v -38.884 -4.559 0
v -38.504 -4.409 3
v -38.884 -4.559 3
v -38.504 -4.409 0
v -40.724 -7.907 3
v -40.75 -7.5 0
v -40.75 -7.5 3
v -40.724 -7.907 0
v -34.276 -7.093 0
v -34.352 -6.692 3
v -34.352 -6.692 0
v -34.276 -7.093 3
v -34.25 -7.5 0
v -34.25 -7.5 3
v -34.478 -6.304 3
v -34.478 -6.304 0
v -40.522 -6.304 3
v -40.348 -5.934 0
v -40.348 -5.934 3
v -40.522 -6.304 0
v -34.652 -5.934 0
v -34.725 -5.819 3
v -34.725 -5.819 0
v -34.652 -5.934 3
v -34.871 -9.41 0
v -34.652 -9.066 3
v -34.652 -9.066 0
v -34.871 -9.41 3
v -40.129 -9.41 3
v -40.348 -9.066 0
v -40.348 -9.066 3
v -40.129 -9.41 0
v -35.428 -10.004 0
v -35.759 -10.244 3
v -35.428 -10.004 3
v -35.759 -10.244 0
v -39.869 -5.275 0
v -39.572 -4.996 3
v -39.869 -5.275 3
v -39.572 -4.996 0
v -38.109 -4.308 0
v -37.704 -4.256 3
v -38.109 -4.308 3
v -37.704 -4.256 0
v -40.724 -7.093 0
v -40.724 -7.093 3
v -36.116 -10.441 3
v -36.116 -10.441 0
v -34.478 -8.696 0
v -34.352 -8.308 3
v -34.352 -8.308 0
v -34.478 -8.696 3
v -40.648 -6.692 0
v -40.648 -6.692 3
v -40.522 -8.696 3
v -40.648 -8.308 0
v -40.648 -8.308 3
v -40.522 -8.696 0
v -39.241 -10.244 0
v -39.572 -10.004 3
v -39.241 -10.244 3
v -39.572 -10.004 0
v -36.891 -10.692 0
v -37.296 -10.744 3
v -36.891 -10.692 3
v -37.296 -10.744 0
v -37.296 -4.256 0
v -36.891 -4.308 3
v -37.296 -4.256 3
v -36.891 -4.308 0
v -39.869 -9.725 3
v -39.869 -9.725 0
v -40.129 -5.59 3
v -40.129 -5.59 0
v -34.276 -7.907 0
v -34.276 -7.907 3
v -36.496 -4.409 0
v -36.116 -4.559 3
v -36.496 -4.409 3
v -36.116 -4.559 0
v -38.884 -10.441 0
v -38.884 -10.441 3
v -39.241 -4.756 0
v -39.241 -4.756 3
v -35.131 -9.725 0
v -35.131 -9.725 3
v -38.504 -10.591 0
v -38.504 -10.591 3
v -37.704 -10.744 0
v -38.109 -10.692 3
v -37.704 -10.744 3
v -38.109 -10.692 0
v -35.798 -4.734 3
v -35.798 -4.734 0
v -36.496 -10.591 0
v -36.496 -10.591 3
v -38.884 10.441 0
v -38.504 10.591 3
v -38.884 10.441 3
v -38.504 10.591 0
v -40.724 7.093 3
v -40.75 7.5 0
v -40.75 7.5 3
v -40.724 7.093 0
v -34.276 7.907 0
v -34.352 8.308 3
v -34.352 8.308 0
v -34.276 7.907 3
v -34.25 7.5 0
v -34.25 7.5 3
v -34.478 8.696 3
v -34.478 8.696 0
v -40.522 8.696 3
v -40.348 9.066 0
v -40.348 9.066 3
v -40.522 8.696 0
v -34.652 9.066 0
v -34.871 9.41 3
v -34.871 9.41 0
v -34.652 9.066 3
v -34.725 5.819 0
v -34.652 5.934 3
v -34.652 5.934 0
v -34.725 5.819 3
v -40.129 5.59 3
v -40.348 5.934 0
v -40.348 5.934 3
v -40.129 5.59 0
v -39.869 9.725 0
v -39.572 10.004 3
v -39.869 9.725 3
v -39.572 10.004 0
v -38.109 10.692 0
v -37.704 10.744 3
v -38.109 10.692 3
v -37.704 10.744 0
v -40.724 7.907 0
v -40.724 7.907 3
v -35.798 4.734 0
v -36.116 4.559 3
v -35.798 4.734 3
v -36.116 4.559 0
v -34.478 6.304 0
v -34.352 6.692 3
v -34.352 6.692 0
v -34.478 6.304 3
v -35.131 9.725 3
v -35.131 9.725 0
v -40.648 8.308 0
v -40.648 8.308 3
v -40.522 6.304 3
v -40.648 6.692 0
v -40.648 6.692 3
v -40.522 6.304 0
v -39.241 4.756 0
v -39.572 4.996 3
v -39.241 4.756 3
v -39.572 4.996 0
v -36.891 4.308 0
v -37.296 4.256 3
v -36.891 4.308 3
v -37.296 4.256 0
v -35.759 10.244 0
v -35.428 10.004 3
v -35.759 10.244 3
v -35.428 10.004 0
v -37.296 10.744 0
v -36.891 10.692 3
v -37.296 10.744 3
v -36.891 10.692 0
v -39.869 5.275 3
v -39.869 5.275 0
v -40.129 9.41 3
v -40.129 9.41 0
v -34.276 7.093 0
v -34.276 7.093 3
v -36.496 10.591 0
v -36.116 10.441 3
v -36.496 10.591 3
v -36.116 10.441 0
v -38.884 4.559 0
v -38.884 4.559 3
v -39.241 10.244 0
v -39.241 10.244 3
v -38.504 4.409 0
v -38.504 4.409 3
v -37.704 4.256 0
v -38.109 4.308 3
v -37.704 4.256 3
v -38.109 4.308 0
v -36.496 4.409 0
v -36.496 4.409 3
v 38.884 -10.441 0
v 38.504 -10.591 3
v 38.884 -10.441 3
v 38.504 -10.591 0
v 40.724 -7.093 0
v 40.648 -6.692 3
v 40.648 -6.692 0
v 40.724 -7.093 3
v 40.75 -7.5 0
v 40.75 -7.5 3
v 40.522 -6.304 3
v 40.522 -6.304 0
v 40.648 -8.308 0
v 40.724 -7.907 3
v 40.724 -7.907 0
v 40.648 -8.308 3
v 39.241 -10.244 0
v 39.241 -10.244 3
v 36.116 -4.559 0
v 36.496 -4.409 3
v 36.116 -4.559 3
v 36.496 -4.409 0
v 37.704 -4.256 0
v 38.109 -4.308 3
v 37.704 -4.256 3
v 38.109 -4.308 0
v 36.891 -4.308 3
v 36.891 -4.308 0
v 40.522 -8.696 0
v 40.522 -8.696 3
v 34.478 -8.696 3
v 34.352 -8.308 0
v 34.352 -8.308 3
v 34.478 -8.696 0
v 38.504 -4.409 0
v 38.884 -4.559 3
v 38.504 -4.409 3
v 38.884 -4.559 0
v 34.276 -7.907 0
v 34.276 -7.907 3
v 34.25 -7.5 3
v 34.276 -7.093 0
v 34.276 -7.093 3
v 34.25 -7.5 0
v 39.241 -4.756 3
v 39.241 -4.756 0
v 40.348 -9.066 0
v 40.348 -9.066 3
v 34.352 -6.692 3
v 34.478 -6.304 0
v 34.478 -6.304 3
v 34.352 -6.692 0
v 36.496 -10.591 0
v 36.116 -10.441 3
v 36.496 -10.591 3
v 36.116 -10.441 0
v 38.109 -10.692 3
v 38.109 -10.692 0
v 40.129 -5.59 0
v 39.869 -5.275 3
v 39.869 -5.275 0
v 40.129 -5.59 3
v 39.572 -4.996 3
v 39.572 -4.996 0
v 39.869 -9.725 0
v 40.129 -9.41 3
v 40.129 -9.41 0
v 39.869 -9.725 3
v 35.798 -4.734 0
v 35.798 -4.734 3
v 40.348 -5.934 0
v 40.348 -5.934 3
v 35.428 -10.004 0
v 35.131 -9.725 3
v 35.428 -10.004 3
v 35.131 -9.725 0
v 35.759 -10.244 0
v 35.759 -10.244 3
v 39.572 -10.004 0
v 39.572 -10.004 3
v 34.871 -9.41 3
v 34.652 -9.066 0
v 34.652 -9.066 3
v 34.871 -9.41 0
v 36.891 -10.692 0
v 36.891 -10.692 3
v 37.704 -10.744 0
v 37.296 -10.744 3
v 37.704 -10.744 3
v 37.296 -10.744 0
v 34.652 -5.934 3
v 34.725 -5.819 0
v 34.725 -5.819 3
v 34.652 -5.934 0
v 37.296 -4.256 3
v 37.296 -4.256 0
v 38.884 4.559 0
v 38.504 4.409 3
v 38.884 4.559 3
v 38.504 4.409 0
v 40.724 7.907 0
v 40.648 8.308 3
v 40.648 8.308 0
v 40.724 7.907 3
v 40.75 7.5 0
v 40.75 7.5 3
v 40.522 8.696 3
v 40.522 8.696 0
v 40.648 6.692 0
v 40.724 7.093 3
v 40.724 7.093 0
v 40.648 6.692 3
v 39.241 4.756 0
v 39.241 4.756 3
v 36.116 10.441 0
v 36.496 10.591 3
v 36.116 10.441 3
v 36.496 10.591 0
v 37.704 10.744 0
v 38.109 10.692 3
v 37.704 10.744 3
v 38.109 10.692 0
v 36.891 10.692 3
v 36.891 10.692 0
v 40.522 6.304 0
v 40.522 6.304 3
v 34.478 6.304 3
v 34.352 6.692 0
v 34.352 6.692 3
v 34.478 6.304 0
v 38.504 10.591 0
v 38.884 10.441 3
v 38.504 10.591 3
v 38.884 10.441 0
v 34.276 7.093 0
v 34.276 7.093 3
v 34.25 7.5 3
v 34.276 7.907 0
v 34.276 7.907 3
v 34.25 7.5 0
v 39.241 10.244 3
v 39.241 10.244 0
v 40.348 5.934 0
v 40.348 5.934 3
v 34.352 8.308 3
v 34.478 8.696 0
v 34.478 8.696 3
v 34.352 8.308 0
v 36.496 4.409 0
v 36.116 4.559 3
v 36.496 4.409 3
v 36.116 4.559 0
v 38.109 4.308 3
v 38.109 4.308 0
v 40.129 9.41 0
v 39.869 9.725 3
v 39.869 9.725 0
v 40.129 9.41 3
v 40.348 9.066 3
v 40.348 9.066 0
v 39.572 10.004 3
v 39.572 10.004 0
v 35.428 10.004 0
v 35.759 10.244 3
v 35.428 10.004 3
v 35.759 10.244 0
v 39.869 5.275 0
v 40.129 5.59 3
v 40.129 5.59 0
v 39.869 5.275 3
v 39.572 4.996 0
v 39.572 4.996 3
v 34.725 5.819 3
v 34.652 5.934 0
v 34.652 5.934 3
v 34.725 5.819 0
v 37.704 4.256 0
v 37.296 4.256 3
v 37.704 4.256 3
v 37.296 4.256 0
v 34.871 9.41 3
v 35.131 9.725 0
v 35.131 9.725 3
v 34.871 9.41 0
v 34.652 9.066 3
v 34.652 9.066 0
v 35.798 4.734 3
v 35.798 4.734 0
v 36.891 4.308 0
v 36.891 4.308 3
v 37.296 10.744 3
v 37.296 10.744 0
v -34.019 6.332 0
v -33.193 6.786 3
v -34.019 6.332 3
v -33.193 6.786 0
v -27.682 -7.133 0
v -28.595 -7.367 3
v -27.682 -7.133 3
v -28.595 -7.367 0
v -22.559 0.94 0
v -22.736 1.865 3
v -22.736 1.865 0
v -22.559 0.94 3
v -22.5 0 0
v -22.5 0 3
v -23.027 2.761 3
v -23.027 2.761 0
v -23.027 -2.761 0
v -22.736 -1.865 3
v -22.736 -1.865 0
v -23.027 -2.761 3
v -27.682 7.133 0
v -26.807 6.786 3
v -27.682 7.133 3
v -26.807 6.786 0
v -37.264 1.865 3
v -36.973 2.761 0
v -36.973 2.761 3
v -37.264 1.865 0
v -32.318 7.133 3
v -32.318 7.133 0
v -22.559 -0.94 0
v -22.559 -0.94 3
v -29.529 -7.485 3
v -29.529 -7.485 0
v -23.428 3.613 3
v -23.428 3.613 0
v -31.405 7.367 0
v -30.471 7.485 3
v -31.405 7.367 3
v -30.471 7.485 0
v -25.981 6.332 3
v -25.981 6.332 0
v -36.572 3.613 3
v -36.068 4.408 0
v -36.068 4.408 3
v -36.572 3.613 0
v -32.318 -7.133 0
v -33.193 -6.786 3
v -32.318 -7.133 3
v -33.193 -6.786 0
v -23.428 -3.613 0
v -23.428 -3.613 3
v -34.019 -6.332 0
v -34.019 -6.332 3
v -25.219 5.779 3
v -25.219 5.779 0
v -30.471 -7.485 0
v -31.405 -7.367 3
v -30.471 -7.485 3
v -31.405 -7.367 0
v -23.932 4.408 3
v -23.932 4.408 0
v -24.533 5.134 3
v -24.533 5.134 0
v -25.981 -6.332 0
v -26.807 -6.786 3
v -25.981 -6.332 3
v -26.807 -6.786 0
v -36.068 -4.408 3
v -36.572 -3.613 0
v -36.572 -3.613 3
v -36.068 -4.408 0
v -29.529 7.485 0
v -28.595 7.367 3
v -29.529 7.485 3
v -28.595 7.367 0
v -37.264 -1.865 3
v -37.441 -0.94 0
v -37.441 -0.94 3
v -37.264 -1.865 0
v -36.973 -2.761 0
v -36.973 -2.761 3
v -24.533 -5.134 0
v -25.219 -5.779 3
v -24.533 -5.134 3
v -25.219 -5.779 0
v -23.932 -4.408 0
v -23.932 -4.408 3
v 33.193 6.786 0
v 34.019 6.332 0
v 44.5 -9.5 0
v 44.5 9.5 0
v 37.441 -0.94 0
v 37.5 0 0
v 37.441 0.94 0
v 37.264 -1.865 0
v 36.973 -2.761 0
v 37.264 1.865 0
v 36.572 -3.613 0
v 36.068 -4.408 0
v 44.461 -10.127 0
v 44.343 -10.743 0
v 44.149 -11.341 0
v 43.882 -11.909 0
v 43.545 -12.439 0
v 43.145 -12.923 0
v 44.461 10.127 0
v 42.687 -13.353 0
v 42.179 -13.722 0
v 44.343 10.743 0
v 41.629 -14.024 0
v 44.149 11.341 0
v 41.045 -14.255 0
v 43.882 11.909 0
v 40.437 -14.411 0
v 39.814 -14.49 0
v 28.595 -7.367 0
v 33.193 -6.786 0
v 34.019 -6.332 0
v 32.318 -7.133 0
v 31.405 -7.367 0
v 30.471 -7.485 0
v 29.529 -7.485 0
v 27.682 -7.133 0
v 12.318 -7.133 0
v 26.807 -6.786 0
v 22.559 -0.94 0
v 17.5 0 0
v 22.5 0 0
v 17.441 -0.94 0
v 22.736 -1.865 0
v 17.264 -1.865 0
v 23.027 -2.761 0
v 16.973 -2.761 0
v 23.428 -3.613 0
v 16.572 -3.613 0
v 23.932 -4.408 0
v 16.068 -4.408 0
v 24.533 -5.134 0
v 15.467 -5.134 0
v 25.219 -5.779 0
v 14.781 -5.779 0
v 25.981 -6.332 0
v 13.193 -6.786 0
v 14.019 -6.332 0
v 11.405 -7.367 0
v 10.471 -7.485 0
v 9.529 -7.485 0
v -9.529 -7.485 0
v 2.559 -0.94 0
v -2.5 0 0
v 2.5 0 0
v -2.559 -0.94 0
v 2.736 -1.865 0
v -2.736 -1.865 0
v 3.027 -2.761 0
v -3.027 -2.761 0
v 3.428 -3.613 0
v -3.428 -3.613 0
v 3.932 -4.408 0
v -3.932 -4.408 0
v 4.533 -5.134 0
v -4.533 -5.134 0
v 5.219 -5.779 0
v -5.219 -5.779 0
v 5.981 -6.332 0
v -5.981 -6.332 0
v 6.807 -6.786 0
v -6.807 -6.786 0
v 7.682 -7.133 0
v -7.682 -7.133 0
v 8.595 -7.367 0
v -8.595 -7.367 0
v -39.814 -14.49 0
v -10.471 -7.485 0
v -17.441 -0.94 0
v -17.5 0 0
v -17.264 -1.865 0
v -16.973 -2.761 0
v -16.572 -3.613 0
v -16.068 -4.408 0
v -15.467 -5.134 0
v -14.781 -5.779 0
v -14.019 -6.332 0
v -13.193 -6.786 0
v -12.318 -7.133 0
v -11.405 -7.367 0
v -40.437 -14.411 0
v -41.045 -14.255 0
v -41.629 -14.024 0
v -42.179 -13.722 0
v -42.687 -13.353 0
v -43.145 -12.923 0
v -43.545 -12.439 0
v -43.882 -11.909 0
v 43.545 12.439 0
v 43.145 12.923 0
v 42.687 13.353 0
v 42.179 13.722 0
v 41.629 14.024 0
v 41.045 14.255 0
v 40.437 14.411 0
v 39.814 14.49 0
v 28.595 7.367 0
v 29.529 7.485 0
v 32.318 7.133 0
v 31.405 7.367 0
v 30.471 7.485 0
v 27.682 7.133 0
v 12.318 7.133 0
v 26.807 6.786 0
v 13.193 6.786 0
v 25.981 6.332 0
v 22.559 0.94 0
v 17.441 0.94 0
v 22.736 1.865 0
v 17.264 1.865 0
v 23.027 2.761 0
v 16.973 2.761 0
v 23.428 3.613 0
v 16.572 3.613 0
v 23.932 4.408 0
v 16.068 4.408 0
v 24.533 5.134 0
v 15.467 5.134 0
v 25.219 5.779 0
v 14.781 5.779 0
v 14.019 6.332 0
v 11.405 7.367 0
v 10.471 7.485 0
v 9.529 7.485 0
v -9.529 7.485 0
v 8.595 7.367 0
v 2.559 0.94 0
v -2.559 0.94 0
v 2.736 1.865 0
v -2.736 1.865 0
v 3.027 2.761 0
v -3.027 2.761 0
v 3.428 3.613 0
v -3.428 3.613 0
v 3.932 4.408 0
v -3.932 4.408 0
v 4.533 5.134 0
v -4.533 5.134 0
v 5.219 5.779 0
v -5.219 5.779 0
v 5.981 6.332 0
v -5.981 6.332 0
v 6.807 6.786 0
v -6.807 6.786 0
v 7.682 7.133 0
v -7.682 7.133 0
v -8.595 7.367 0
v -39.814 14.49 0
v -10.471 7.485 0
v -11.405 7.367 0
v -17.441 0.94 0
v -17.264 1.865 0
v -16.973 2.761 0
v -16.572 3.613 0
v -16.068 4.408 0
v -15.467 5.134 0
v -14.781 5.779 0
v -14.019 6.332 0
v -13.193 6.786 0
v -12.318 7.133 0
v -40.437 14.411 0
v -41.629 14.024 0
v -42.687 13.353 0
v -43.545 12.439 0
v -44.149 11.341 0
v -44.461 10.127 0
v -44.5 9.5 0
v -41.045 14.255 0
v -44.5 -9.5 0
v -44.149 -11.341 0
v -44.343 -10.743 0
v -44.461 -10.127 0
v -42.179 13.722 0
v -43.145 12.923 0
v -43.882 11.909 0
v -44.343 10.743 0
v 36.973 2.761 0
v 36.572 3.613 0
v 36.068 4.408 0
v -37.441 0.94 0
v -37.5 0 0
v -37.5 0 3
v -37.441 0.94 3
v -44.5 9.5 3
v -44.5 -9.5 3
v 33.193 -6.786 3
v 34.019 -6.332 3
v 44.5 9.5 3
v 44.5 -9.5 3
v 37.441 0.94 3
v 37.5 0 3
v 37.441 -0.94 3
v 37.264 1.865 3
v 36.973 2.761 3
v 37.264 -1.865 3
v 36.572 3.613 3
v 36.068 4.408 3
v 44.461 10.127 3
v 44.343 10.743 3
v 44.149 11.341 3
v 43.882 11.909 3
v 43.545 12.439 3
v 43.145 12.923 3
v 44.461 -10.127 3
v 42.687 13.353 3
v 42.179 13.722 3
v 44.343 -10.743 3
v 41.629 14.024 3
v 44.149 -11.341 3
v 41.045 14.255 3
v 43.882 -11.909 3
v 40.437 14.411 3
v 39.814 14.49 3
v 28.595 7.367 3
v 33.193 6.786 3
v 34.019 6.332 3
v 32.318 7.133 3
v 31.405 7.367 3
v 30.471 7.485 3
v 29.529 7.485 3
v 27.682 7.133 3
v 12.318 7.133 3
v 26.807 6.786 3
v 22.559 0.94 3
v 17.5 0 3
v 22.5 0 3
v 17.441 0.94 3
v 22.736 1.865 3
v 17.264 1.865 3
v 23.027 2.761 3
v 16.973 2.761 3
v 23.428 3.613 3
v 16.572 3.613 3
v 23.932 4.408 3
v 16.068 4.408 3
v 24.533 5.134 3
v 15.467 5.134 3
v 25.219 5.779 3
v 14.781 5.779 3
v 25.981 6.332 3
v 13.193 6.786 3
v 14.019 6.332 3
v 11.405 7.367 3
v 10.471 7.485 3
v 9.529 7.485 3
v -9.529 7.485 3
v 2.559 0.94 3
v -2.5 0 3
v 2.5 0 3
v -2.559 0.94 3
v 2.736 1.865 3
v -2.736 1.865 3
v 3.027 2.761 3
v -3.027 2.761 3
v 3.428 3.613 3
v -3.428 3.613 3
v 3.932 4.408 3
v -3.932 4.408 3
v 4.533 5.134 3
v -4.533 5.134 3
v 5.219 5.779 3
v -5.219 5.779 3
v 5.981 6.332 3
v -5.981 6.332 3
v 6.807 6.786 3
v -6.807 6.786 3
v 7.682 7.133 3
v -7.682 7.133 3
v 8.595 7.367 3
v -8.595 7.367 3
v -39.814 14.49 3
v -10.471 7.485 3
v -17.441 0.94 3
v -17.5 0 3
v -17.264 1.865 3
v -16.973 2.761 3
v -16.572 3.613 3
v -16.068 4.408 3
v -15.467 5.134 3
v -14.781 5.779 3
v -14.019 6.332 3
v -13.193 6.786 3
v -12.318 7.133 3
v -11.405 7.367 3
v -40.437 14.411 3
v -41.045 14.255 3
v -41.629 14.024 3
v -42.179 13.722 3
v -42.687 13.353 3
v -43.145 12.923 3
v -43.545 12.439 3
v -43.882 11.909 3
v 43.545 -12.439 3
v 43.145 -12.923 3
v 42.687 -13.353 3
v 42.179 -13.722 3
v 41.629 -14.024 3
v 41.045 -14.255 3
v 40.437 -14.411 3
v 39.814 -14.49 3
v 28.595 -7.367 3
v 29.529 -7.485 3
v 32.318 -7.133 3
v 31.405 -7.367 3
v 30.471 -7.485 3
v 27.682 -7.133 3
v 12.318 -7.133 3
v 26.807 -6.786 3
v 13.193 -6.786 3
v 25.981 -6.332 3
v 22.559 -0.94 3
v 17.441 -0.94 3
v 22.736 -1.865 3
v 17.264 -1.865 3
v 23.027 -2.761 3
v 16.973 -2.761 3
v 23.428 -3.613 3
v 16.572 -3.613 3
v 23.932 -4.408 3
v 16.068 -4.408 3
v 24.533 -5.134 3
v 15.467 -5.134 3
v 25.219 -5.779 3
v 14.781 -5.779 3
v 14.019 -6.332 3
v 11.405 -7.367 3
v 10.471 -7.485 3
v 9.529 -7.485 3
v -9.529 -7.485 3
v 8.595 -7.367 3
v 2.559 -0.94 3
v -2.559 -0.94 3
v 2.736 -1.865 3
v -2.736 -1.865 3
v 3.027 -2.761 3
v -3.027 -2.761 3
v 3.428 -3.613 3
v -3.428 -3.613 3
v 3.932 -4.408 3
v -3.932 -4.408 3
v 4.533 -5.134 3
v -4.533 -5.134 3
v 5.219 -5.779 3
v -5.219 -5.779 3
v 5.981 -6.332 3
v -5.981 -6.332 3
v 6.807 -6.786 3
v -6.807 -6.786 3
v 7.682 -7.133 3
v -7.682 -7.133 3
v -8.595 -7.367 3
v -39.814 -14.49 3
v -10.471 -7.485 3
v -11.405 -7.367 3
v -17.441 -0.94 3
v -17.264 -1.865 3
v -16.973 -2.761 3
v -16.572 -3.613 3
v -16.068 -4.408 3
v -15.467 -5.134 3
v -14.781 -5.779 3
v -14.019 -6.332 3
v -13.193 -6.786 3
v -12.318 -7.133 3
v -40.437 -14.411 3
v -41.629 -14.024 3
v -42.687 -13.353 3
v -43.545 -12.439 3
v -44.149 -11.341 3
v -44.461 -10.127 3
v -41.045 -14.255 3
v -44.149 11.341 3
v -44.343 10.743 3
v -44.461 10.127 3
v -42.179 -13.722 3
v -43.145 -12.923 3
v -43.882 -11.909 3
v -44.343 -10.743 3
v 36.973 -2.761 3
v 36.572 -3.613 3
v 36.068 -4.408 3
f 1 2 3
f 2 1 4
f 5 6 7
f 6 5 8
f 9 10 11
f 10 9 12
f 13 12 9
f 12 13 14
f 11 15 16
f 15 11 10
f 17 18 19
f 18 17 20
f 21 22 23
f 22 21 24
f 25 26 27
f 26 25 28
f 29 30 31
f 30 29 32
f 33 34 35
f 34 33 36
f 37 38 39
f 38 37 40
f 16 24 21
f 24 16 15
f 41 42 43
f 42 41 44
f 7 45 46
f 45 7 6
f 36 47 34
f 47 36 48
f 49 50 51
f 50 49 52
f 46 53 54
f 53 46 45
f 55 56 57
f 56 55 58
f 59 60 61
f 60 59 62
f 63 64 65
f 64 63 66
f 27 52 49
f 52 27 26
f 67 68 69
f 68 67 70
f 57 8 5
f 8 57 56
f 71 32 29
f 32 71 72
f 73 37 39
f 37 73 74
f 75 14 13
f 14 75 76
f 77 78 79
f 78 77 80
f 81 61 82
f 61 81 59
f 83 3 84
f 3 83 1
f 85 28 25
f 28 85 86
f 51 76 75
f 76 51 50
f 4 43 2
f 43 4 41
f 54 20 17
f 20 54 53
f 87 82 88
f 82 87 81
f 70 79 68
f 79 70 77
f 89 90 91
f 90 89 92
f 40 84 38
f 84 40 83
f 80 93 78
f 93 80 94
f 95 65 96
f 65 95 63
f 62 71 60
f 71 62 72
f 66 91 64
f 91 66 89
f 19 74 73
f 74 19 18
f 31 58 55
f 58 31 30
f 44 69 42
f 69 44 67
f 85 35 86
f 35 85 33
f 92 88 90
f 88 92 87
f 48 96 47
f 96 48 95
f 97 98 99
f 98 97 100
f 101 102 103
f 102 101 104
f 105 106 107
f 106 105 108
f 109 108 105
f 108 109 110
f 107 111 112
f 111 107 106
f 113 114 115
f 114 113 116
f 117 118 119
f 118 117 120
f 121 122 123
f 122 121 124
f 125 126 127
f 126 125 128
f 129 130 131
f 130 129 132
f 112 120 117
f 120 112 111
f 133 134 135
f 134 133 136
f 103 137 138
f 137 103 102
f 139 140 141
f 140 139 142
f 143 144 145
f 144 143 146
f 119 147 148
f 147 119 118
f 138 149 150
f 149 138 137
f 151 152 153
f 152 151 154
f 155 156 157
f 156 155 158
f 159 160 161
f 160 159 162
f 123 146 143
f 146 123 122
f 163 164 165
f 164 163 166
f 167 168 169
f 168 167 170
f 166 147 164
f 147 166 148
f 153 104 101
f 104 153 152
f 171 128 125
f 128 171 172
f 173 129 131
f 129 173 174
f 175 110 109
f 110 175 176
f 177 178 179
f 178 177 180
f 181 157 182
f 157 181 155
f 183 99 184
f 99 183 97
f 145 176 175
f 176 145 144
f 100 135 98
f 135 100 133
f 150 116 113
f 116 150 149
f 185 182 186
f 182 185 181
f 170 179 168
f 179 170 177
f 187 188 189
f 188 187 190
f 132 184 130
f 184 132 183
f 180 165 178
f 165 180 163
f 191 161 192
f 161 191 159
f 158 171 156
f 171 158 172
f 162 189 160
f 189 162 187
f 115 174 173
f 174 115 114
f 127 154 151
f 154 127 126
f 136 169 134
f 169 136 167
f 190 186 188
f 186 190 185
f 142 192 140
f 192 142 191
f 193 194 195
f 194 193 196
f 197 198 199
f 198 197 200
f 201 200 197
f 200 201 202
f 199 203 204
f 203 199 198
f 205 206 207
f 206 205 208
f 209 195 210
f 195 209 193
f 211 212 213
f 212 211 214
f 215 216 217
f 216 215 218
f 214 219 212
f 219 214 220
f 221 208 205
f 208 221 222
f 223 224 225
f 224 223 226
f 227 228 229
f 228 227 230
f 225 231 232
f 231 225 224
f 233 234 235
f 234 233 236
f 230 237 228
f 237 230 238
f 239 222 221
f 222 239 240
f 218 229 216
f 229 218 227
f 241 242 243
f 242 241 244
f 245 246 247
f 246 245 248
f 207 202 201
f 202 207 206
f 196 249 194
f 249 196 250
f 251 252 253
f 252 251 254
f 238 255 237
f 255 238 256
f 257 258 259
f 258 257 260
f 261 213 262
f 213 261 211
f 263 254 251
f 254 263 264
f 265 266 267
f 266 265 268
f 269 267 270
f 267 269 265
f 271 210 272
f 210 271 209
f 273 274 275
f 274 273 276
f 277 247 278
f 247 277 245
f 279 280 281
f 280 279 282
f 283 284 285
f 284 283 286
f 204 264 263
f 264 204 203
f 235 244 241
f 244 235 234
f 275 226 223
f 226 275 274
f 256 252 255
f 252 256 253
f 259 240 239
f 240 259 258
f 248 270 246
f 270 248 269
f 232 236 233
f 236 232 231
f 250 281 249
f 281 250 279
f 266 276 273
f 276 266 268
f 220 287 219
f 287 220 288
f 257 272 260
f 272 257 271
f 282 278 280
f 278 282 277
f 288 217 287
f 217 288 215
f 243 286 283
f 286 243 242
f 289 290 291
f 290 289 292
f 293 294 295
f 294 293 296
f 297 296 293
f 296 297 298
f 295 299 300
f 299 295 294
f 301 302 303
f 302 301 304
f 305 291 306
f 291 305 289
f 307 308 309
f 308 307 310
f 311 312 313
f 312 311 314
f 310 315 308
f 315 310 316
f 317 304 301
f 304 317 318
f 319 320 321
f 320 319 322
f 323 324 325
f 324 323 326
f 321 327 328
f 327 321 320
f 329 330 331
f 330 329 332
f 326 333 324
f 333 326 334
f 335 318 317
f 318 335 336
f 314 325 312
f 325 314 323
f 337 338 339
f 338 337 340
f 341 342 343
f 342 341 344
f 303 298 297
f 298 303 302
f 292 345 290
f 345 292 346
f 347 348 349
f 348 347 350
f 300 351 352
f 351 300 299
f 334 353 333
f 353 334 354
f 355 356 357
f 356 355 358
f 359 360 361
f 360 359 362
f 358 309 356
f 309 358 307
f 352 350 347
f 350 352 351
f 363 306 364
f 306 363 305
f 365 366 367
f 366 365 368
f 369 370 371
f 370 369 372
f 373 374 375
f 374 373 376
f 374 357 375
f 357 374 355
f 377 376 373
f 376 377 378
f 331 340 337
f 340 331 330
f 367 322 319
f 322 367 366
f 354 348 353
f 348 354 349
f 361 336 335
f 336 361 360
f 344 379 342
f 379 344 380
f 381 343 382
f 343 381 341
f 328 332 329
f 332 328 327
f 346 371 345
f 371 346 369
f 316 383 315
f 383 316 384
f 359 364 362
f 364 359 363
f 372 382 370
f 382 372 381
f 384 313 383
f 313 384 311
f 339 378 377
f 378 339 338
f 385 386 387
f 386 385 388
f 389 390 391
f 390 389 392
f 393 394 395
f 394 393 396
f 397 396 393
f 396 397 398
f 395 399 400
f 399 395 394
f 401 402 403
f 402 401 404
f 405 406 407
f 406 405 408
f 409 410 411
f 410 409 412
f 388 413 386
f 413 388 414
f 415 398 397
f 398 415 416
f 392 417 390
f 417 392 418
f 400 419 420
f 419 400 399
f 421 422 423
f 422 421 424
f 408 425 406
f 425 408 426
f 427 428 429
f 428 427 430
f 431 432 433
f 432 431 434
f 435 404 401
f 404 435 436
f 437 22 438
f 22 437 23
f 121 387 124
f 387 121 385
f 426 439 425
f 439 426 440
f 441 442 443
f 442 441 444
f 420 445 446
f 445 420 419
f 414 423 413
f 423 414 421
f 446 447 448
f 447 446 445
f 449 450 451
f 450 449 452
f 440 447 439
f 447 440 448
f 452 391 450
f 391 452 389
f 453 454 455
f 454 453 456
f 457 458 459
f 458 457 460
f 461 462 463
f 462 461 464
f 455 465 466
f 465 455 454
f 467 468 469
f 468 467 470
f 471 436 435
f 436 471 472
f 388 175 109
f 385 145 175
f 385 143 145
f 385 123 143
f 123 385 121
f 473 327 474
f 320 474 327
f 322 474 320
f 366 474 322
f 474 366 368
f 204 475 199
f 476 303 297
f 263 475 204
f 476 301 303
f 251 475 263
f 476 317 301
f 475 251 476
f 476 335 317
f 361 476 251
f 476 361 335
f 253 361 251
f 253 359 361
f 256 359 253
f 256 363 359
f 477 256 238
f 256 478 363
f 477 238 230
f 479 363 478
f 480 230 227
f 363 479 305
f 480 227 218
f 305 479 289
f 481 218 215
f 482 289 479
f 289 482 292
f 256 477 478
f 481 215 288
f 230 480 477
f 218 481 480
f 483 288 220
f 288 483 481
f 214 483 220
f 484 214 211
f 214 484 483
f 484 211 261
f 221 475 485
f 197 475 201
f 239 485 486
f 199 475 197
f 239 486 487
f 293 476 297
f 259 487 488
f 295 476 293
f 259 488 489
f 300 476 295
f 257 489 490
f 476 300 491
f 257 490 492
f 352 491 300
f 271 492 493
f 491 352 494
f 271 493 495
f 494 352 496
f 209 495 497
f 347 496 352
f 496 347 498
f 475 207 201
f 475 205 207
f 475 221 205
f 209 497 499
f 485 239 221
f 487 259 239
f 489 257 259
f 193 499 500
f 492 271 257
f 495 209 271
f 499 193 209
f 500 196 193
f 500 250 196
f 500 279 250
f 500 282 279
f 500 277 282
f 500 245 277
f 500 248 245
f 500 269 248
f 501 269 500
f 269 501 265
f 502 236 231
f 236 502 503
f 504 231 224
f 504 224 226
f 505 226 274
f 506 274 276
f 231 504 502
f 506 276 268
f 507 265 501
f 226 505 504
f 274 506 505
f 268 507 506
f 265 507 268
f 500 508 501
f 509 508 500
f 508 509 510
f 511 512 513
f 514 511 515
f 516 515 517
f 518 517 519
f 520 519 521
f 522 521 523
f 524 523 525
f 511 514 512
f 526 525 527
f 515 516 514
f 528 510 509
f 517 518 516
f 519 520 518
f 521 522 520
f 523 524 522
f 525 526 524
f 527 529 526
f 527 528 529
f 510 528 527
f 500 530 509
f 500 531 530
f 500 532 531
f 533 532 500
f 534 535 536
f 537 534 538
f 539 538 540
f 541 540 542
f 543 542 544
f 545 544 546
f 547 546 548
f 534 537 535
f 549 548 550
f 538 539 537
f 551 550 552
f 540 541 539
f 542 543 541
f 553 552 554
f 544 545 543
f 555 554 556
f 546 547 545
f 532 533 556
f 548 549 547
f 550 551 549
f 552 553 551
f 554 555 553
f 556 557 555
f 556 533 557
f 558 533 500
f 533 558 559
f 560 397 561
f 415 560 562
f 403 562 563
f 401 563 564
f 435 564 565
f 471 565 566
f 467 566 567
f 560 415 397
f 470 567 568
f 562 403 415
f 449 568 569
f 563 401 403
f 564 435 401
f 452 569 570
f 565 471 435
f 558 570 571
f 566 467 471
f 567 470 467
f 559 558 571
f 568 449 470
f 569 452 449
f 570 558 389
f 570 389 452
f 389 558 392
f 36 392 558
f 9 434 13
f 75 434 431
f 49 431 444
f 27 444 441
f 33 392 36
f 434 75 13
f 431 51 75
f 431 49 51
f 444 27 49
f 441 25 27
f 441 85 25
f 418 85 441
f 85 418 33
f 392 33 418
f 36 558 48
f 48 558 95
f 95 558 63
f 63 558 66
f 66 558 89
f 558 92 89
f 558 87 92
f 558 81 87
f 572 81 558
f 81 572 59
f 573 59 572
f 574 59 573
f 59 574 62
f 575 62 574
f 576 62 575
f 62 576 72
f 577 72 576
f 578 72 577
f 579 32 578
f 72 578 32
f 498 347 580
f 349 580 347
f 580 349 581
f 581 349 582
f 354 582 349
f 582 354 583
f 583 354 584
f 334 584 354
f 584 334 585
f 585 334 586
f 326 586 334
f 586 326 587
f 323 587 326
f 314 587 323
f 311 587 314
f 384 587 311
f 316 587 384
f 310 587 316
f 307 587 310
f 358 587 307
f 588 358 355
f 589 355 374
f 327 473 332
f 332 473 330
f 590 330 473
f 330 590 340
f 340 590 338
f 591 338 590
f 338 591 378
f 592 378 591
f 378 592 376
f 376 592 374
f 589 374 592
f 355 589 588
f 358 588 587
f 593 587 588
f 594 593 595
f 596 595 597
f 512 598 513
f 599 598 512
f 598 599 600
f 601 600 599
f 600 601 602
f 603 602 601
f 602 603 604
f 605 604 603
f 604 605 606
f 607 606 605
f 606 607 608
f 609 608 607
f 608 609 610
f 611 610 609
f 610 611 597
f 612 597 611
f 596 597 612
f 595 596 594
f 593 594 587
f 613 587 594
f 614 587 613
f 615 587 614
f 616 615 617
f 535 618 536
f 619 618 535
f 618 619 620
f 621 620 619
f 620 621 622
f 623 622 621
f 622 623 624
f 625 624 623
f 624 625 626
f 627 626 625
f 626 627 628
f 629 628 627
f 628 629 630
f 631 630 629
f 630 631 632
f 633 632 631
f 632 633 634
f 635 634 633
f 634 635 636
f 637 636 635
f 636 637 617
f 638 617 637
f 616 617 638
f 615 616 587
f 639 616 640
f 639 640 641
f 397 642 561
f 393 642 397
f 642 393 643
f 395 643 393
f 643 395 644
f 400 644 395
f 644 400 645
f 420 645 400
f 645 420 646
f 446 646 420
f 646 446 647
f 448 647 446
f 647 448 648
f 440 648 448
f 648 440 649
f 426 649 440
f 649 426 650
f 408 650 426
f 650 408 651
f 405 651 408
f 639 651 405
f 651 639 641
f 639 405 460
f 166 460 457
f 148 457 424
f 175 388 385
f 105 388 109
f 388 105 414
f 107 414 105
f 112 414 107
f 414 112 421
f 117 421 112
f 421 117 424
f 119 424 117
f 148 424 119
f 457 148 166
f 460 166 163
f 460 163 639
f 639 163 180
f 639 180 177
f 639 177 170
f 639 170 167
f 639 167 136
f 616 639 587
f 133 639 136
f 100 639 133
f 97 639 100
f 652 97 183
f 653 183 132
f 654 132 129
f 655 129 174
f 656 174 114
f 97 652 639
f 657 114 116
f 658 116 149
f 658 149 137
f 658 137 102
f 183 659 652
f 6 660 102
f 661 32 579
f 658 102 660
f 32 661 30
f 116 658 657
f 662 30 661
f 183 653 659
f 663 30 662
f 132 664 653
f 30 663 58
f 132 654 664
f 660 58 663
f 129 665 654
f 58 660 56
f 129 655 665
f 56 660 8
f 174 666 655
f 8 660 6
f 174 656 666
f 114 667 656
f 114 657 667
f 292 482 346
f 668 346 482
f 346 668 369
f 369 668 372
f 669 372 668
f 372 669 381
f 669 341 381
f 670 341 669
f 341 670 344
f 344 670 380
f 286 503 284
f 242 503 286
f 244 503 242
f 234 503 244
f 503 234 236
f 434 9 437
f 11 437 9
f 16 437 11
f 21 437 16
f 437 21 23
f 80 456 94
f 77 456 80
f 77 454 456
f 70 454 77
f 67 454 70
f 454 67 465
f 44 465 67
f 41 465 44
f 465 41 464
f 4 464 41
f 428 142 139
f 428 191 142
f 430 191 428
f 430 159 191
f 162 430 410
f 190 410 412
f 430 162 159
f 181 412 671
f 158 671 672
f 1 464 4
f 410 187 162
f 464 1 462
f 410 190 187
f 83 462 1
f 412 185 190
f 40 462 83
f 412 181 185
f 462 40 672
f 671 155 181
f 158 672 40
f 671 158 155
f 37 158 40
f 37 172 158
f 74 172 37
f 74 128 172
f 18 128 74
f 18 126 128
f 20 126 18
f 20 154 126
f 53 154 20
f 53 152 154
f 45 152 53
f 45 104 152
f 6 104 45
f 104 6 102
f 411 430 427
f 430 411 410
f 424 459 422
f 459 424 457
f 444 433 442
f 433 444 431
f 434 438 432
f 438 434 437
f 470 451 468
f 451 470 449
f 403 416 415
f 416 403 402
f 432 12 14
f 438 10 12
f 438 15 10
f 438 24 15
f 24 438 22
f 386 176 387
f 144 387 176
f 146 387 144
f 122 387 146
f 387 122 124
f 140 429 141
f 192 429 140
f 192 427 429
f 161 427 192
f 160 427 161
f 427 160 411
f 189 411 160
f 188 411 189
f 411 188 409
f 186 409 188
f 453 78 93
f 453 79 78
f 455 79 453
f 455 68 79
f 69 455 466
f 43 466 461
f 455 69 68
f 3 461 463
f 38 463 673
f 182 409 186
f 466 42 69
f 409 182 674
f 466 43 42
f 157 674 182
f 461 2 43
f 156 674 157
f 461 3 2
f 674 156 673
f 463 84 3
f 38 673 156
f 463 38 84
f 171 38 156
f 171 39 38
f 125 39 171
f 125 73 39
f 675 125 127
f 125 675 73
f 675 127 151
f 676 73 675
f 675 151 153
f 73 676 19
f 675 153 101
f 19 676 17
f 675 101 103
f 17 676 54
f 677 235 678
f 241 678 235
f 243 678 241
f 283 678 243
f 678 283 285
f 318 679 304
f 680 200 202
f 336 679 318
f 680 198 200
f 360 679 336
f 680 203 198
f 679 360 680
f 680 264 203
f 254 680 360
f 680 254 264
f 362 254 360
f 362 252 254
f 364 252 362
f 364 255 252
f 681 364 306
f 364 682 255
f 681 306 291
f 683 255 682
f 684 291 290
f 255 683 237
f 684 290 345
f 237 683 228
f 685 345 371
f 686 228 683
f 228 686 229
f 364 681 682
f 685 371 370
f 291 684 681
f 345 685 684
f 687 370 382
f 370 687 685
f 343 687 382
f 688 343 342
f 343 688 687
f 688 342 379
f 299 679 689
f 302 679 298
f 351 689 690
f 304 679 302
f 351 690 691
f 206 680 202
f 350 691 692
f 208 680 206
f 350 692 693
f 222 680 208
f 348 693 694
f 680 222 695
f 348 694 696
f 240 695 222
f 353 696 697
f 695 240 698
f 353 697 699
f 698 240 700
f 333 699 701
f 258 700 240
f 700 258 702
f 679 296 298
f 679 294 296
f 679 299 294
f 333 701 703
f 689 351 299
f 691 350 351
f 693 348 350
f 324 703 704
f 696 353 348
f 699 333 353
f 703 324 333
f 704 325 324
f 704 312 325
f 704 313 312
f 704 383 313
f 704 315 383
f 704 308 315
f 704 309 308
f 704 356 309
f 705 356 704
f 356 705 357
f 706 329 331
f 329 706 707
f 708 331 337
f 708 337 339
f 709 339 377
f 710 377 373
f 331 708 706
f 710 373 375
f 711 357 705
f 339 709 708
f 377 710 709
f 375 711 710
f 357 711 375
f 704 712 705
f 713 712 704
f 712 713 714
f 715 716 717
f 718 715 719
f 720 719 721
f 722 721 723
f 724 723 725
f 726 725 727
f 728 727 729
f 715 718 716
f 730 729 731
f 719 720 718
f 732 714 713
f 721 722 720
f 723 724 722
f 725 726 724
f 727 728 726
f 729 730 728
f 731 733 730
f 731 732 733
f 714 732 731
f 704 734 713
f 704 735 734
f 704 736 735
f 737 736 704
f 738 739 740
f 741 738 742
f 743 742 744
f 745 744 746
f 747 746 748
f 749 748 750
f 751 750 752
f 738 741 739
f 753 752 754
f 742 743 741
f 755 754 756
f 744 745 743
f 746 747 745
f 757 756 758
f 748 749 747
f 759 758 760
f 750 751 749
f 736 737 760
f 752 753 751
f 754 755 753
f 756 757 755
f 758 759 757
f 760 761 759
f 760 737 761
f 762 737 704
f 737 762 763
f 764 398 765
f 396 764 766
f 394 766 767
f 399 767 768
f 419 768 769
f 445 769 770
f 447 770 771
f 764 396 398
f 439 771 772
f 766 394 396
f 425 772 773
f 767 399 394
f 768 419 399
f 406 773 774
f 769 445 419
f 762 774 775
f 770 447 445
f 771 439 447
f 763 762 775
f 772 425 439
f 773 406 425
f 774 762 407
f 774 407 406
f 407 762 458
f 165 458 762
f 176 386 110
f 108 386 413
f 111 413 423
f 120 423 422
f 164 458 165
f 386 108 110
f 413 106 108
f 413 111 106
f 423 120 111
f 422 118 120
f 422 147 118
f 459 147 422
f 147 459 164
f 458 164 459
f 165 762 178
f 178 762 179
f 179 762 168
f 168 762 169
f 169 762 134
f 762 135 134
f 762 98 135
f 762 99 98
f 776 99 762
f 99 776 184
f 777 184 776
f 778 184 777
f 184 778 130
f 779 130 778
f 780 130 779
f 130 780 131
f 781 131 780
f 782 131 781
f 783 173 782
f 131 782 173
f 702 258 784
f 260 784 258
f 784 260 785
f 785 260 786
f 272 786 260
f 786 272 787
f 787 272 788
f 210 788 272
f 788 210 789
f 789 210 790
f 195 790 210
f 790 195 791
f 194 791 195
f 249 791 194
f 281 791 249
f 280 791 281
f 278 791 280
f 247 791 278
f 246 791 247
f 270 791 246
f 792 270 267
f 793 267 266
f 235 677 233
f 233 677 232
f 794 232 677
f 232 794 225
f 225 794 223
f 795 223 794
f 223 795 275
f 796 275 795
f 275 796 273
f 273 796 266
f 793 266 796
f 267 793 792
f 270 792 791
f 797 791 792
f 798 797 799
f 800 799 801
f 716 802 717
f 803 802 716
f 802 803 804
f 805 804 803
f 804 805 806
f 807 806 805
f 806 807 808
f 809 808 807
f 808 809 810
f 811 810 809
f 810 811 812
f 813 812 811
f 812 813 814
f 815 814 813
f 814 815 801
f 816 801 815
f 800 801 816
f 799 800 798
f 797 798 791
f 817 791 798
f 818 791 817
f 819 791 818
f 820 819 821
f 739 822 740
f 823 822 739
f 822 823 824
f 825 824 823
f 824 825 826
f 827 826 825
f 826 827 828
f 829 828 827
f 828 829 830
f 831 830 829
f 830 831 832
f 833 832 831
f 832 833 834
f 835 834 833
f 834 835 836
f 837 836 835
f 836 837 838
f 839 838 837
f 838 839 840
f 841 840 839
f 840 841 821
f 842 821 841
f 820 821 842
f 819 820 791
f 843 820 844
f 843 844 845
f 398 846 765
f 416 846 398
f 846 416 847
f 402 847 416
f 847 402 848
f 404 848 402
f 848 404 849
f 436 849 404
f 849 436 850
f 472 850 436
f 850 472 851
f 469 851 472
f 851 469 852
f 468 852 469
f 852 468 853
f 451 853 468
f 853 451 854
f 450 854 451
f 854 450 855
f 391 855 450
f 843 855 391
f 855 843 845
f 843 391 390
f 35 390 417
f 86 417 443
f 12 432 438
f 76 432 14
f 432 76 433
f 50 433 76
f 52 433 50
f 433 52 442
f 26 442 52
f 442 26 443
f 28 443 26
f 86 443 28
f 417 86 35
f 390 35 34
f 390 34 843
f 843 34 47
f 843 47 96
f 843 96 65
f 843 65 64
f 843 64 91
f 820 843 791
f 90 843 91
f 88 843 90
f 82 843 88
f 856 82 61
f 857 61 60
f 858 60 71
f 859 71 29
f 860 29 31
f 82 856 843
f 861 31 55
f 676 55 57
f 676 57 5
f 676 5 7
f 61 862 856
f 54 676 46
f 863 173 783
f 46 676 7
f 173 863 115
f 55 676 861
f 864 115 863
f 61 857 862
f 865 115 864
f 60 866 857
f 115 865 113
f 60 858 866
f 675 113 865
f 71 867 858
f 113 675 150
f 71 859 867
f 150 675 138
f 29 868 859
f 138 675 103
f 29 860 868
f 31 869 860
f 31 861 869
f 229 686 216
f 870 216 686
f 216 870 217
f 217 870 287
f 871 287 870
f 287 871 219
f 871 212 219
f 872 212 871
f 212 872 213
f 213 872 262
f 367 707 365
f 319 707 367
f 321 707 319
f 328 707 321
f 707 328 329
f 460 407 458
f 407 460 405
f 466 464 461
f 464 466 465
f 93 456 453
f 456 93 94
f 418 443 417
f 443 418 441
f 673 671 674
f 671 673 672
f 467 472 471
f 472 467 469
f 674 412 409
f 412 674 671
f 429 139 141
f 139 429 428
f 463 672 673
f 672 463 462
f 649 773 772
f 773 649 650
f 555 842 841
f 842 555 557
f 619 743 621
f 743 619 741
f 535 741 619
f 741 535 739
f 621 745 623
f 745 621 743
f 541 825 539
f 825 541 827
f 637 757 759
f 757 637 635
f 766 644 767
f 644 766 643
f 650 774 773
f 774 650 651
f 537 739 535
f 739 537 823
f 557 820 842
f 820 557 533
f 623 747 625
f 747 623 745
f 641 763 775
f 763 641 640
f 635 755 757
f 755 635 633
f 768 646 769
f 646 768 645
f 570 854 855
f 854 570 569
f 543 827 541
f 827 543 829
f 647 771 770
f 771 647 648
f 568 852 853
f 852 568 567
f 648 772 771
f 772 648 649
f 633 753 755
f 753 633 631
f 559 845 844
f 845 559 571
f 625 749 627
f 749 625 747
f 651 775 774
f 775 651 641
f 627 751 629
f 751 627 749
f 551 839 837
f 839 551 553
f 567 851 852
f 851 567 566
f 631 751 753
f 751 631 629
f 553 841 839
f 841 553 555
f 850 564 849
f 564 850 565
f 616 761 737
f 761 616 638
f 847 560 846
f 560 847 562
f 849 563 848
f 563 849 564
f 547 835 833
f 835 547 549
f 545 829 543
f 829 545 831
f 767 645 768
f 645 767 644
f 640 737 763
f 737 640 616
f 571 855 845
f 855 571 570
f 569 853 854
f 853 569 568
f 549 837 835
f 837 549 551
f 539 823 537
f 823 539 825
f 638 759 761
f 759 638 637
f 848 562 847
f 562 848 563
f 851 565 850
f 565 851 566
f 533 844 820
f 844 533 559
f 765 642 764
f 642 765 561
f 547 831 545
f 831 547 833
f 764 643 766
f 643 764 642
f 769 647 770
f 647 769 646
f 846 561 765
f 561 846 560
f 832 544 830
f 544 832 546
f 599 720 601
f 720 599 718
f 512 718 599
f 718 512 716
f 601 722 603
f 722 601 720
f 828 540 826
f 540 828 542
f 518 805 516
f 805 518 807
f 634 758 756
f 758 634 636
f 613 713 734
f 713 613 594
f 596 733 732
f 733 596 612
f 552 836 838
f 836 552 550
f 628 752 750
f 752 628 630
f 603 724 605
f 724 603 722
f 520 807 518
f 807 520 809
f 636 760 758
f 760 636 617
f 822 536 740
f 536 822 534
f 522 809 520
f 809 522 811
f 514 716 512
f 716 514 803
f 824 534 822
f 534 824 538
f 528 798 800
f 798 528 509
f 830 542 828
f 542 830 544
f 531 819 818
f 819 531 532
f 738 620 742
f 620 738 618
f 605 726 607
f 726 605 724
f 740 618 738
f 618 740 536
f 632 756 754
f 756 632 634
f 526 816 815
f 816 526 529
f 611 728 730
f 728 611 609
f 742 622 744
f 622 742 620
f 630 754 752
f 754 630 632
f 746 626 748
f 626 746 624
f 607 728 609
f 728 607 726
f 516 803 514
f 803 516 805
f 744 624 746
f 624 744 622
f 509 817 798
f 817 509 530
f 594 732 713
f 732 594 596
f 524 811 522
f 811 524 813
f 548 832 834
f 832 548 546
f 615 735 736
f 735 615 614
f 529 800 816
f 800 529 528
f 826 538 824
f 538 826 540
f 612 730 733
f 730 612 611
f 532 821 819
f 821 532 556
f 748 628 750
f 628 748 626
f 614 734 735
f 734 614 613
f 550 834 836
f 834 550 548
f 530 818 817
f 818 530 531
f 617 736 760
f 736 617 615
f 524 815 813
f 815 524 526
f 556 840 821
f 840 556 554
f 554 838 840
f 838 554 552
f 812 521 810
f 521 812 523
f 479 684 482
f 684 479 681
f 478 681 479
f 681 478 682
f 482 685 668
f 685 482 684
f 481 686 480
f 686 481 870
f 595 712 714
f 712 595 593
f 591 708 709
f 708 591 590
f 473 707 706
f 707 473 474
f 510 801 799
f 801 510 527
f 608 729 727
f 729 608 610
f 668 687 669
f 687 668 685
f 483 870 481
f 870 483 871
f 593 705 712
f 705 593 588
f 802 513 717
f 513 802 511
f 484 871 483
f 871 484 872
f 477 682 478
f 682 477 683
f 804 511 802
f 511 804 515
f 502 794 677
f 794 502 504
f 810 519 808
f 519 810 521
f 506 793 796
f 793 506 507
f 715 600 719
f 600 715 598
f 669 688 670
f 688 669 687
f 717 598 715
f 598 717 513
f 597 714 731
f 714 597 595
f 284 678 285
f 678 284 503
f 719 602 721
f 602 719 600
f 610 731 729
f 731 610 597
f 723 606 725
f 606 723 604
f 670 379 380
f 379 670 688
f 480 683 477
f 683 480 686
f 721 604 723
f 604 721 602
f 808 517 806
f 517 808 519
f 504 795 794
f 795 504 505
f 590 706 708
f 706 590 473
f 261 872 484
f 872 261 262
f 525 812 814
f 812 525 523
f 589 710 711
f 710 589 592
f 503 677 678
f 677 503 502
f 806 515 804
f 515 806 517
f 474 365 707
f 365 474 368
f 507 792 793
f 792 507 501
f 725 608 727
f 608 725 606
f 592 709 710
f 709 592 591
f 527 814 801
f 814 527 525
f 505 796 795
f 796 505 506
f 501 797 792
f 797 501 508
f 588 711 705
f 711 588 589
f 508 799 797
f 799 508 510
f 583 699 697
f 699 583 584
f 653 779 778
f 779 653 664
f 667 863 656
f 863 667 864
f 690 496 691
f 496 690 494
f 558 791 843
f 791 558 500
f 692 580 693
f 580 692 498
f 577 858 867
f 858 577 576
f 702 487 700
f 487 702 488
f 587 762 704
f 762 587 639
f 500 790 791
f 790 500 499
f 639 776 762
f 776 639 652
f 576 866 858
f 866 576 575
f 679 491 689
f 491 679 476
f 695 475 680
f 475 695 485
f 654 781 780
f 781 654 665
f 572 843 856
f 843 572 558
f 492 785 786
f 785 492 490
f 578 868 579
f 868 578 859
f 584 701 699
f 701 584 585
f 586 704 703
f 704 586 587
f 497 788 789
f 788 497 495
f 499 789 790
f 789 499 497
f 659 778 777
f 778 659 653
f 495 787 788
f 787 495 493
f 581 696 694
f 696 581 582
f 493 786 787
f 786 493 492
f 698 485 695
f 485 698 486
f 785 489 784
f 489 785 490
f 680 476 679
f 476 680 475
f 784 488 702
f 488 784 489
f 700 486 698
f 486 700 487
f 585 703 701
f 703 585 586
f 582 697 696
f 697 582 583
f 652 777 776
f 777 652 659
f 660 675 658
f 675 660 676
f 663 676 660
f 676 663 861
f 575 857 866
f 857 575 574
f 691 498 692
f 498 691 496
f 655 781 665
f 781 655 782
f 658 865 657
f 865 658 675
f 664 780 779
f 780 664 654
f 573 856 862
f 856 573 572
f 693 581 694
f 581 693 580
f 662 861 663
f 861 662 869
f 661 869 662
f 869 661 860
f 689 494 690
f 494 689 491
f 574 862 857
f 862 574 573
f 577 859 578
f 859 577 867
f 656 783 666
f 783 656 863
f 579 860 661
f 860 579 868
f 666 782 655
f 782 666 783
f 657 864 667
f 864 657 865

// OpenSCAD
$fn = 50;

difference() {
	union() {
		hull() {
			translate(v = [-39.5, 9.5, 0]) {
				cylinder(h = 3, r = 5);
			}
			translate(v = [39.5, 9.5, 0]) {
				cylinder(h = 3, r = 5);
			}
			translate(v = [-39.5, -9.5, 0]) {
				cylinder(h = 3, r = 5);
			}
			translate(v = [39.5, -9.5, 0]) {
				cylinder(h = 3, r = 5);
			}
		}
	}
	union() {
		translate(v = [-37.5, -7.5, -100.0]) {
			cylinder(h = 200, r = 3.25);
		}
		translate(v = [-37.5, 7.5, -100.0]) {
			cylinder(h = 200, r = 3.25);
		}
		translate(v = [37.5, -7.5, -100.0]) {
			cylinder(h = 200, r = 3.25);
		}
		translate(v = [37.5, 7.5, -100.0]) {
			cylinder(h = 200, r = 3.25);
		}
		translate(v = [-37.5, -7.5, -100.0]) {
			cylinder(h = 200, r = 1.8);
		}
		translate(v = [-37.5, 7.5, -100.0]) {
			cylinder(h = 200, r = 1.8);
		}
		translate(v = [37.5, -7.5, -100.0]) {
			cylinder(h = 200, r = 1.8);
		}
		translate(v = [37.5, 7.5, -100.0]) {
			cylinder(h = 200, r = 1.8);
		}
		translate(v = [-30.0, 0, 0.0]) {
			cylinder(h = 3, r = 7.5);
		}
		translate(v = [-10.0, 0, 0.0]) {
			cylinder(h = 3, r = 7.5);
		}
		translate(v = [10.0, 0, 0.0]) {
			cylinder(h = 3, r = 7.5);
		}
		translate(v = [30.0, 0, 0.0]) {
			cylinder(h = 3, r = 7.5);
		}
	}
}
